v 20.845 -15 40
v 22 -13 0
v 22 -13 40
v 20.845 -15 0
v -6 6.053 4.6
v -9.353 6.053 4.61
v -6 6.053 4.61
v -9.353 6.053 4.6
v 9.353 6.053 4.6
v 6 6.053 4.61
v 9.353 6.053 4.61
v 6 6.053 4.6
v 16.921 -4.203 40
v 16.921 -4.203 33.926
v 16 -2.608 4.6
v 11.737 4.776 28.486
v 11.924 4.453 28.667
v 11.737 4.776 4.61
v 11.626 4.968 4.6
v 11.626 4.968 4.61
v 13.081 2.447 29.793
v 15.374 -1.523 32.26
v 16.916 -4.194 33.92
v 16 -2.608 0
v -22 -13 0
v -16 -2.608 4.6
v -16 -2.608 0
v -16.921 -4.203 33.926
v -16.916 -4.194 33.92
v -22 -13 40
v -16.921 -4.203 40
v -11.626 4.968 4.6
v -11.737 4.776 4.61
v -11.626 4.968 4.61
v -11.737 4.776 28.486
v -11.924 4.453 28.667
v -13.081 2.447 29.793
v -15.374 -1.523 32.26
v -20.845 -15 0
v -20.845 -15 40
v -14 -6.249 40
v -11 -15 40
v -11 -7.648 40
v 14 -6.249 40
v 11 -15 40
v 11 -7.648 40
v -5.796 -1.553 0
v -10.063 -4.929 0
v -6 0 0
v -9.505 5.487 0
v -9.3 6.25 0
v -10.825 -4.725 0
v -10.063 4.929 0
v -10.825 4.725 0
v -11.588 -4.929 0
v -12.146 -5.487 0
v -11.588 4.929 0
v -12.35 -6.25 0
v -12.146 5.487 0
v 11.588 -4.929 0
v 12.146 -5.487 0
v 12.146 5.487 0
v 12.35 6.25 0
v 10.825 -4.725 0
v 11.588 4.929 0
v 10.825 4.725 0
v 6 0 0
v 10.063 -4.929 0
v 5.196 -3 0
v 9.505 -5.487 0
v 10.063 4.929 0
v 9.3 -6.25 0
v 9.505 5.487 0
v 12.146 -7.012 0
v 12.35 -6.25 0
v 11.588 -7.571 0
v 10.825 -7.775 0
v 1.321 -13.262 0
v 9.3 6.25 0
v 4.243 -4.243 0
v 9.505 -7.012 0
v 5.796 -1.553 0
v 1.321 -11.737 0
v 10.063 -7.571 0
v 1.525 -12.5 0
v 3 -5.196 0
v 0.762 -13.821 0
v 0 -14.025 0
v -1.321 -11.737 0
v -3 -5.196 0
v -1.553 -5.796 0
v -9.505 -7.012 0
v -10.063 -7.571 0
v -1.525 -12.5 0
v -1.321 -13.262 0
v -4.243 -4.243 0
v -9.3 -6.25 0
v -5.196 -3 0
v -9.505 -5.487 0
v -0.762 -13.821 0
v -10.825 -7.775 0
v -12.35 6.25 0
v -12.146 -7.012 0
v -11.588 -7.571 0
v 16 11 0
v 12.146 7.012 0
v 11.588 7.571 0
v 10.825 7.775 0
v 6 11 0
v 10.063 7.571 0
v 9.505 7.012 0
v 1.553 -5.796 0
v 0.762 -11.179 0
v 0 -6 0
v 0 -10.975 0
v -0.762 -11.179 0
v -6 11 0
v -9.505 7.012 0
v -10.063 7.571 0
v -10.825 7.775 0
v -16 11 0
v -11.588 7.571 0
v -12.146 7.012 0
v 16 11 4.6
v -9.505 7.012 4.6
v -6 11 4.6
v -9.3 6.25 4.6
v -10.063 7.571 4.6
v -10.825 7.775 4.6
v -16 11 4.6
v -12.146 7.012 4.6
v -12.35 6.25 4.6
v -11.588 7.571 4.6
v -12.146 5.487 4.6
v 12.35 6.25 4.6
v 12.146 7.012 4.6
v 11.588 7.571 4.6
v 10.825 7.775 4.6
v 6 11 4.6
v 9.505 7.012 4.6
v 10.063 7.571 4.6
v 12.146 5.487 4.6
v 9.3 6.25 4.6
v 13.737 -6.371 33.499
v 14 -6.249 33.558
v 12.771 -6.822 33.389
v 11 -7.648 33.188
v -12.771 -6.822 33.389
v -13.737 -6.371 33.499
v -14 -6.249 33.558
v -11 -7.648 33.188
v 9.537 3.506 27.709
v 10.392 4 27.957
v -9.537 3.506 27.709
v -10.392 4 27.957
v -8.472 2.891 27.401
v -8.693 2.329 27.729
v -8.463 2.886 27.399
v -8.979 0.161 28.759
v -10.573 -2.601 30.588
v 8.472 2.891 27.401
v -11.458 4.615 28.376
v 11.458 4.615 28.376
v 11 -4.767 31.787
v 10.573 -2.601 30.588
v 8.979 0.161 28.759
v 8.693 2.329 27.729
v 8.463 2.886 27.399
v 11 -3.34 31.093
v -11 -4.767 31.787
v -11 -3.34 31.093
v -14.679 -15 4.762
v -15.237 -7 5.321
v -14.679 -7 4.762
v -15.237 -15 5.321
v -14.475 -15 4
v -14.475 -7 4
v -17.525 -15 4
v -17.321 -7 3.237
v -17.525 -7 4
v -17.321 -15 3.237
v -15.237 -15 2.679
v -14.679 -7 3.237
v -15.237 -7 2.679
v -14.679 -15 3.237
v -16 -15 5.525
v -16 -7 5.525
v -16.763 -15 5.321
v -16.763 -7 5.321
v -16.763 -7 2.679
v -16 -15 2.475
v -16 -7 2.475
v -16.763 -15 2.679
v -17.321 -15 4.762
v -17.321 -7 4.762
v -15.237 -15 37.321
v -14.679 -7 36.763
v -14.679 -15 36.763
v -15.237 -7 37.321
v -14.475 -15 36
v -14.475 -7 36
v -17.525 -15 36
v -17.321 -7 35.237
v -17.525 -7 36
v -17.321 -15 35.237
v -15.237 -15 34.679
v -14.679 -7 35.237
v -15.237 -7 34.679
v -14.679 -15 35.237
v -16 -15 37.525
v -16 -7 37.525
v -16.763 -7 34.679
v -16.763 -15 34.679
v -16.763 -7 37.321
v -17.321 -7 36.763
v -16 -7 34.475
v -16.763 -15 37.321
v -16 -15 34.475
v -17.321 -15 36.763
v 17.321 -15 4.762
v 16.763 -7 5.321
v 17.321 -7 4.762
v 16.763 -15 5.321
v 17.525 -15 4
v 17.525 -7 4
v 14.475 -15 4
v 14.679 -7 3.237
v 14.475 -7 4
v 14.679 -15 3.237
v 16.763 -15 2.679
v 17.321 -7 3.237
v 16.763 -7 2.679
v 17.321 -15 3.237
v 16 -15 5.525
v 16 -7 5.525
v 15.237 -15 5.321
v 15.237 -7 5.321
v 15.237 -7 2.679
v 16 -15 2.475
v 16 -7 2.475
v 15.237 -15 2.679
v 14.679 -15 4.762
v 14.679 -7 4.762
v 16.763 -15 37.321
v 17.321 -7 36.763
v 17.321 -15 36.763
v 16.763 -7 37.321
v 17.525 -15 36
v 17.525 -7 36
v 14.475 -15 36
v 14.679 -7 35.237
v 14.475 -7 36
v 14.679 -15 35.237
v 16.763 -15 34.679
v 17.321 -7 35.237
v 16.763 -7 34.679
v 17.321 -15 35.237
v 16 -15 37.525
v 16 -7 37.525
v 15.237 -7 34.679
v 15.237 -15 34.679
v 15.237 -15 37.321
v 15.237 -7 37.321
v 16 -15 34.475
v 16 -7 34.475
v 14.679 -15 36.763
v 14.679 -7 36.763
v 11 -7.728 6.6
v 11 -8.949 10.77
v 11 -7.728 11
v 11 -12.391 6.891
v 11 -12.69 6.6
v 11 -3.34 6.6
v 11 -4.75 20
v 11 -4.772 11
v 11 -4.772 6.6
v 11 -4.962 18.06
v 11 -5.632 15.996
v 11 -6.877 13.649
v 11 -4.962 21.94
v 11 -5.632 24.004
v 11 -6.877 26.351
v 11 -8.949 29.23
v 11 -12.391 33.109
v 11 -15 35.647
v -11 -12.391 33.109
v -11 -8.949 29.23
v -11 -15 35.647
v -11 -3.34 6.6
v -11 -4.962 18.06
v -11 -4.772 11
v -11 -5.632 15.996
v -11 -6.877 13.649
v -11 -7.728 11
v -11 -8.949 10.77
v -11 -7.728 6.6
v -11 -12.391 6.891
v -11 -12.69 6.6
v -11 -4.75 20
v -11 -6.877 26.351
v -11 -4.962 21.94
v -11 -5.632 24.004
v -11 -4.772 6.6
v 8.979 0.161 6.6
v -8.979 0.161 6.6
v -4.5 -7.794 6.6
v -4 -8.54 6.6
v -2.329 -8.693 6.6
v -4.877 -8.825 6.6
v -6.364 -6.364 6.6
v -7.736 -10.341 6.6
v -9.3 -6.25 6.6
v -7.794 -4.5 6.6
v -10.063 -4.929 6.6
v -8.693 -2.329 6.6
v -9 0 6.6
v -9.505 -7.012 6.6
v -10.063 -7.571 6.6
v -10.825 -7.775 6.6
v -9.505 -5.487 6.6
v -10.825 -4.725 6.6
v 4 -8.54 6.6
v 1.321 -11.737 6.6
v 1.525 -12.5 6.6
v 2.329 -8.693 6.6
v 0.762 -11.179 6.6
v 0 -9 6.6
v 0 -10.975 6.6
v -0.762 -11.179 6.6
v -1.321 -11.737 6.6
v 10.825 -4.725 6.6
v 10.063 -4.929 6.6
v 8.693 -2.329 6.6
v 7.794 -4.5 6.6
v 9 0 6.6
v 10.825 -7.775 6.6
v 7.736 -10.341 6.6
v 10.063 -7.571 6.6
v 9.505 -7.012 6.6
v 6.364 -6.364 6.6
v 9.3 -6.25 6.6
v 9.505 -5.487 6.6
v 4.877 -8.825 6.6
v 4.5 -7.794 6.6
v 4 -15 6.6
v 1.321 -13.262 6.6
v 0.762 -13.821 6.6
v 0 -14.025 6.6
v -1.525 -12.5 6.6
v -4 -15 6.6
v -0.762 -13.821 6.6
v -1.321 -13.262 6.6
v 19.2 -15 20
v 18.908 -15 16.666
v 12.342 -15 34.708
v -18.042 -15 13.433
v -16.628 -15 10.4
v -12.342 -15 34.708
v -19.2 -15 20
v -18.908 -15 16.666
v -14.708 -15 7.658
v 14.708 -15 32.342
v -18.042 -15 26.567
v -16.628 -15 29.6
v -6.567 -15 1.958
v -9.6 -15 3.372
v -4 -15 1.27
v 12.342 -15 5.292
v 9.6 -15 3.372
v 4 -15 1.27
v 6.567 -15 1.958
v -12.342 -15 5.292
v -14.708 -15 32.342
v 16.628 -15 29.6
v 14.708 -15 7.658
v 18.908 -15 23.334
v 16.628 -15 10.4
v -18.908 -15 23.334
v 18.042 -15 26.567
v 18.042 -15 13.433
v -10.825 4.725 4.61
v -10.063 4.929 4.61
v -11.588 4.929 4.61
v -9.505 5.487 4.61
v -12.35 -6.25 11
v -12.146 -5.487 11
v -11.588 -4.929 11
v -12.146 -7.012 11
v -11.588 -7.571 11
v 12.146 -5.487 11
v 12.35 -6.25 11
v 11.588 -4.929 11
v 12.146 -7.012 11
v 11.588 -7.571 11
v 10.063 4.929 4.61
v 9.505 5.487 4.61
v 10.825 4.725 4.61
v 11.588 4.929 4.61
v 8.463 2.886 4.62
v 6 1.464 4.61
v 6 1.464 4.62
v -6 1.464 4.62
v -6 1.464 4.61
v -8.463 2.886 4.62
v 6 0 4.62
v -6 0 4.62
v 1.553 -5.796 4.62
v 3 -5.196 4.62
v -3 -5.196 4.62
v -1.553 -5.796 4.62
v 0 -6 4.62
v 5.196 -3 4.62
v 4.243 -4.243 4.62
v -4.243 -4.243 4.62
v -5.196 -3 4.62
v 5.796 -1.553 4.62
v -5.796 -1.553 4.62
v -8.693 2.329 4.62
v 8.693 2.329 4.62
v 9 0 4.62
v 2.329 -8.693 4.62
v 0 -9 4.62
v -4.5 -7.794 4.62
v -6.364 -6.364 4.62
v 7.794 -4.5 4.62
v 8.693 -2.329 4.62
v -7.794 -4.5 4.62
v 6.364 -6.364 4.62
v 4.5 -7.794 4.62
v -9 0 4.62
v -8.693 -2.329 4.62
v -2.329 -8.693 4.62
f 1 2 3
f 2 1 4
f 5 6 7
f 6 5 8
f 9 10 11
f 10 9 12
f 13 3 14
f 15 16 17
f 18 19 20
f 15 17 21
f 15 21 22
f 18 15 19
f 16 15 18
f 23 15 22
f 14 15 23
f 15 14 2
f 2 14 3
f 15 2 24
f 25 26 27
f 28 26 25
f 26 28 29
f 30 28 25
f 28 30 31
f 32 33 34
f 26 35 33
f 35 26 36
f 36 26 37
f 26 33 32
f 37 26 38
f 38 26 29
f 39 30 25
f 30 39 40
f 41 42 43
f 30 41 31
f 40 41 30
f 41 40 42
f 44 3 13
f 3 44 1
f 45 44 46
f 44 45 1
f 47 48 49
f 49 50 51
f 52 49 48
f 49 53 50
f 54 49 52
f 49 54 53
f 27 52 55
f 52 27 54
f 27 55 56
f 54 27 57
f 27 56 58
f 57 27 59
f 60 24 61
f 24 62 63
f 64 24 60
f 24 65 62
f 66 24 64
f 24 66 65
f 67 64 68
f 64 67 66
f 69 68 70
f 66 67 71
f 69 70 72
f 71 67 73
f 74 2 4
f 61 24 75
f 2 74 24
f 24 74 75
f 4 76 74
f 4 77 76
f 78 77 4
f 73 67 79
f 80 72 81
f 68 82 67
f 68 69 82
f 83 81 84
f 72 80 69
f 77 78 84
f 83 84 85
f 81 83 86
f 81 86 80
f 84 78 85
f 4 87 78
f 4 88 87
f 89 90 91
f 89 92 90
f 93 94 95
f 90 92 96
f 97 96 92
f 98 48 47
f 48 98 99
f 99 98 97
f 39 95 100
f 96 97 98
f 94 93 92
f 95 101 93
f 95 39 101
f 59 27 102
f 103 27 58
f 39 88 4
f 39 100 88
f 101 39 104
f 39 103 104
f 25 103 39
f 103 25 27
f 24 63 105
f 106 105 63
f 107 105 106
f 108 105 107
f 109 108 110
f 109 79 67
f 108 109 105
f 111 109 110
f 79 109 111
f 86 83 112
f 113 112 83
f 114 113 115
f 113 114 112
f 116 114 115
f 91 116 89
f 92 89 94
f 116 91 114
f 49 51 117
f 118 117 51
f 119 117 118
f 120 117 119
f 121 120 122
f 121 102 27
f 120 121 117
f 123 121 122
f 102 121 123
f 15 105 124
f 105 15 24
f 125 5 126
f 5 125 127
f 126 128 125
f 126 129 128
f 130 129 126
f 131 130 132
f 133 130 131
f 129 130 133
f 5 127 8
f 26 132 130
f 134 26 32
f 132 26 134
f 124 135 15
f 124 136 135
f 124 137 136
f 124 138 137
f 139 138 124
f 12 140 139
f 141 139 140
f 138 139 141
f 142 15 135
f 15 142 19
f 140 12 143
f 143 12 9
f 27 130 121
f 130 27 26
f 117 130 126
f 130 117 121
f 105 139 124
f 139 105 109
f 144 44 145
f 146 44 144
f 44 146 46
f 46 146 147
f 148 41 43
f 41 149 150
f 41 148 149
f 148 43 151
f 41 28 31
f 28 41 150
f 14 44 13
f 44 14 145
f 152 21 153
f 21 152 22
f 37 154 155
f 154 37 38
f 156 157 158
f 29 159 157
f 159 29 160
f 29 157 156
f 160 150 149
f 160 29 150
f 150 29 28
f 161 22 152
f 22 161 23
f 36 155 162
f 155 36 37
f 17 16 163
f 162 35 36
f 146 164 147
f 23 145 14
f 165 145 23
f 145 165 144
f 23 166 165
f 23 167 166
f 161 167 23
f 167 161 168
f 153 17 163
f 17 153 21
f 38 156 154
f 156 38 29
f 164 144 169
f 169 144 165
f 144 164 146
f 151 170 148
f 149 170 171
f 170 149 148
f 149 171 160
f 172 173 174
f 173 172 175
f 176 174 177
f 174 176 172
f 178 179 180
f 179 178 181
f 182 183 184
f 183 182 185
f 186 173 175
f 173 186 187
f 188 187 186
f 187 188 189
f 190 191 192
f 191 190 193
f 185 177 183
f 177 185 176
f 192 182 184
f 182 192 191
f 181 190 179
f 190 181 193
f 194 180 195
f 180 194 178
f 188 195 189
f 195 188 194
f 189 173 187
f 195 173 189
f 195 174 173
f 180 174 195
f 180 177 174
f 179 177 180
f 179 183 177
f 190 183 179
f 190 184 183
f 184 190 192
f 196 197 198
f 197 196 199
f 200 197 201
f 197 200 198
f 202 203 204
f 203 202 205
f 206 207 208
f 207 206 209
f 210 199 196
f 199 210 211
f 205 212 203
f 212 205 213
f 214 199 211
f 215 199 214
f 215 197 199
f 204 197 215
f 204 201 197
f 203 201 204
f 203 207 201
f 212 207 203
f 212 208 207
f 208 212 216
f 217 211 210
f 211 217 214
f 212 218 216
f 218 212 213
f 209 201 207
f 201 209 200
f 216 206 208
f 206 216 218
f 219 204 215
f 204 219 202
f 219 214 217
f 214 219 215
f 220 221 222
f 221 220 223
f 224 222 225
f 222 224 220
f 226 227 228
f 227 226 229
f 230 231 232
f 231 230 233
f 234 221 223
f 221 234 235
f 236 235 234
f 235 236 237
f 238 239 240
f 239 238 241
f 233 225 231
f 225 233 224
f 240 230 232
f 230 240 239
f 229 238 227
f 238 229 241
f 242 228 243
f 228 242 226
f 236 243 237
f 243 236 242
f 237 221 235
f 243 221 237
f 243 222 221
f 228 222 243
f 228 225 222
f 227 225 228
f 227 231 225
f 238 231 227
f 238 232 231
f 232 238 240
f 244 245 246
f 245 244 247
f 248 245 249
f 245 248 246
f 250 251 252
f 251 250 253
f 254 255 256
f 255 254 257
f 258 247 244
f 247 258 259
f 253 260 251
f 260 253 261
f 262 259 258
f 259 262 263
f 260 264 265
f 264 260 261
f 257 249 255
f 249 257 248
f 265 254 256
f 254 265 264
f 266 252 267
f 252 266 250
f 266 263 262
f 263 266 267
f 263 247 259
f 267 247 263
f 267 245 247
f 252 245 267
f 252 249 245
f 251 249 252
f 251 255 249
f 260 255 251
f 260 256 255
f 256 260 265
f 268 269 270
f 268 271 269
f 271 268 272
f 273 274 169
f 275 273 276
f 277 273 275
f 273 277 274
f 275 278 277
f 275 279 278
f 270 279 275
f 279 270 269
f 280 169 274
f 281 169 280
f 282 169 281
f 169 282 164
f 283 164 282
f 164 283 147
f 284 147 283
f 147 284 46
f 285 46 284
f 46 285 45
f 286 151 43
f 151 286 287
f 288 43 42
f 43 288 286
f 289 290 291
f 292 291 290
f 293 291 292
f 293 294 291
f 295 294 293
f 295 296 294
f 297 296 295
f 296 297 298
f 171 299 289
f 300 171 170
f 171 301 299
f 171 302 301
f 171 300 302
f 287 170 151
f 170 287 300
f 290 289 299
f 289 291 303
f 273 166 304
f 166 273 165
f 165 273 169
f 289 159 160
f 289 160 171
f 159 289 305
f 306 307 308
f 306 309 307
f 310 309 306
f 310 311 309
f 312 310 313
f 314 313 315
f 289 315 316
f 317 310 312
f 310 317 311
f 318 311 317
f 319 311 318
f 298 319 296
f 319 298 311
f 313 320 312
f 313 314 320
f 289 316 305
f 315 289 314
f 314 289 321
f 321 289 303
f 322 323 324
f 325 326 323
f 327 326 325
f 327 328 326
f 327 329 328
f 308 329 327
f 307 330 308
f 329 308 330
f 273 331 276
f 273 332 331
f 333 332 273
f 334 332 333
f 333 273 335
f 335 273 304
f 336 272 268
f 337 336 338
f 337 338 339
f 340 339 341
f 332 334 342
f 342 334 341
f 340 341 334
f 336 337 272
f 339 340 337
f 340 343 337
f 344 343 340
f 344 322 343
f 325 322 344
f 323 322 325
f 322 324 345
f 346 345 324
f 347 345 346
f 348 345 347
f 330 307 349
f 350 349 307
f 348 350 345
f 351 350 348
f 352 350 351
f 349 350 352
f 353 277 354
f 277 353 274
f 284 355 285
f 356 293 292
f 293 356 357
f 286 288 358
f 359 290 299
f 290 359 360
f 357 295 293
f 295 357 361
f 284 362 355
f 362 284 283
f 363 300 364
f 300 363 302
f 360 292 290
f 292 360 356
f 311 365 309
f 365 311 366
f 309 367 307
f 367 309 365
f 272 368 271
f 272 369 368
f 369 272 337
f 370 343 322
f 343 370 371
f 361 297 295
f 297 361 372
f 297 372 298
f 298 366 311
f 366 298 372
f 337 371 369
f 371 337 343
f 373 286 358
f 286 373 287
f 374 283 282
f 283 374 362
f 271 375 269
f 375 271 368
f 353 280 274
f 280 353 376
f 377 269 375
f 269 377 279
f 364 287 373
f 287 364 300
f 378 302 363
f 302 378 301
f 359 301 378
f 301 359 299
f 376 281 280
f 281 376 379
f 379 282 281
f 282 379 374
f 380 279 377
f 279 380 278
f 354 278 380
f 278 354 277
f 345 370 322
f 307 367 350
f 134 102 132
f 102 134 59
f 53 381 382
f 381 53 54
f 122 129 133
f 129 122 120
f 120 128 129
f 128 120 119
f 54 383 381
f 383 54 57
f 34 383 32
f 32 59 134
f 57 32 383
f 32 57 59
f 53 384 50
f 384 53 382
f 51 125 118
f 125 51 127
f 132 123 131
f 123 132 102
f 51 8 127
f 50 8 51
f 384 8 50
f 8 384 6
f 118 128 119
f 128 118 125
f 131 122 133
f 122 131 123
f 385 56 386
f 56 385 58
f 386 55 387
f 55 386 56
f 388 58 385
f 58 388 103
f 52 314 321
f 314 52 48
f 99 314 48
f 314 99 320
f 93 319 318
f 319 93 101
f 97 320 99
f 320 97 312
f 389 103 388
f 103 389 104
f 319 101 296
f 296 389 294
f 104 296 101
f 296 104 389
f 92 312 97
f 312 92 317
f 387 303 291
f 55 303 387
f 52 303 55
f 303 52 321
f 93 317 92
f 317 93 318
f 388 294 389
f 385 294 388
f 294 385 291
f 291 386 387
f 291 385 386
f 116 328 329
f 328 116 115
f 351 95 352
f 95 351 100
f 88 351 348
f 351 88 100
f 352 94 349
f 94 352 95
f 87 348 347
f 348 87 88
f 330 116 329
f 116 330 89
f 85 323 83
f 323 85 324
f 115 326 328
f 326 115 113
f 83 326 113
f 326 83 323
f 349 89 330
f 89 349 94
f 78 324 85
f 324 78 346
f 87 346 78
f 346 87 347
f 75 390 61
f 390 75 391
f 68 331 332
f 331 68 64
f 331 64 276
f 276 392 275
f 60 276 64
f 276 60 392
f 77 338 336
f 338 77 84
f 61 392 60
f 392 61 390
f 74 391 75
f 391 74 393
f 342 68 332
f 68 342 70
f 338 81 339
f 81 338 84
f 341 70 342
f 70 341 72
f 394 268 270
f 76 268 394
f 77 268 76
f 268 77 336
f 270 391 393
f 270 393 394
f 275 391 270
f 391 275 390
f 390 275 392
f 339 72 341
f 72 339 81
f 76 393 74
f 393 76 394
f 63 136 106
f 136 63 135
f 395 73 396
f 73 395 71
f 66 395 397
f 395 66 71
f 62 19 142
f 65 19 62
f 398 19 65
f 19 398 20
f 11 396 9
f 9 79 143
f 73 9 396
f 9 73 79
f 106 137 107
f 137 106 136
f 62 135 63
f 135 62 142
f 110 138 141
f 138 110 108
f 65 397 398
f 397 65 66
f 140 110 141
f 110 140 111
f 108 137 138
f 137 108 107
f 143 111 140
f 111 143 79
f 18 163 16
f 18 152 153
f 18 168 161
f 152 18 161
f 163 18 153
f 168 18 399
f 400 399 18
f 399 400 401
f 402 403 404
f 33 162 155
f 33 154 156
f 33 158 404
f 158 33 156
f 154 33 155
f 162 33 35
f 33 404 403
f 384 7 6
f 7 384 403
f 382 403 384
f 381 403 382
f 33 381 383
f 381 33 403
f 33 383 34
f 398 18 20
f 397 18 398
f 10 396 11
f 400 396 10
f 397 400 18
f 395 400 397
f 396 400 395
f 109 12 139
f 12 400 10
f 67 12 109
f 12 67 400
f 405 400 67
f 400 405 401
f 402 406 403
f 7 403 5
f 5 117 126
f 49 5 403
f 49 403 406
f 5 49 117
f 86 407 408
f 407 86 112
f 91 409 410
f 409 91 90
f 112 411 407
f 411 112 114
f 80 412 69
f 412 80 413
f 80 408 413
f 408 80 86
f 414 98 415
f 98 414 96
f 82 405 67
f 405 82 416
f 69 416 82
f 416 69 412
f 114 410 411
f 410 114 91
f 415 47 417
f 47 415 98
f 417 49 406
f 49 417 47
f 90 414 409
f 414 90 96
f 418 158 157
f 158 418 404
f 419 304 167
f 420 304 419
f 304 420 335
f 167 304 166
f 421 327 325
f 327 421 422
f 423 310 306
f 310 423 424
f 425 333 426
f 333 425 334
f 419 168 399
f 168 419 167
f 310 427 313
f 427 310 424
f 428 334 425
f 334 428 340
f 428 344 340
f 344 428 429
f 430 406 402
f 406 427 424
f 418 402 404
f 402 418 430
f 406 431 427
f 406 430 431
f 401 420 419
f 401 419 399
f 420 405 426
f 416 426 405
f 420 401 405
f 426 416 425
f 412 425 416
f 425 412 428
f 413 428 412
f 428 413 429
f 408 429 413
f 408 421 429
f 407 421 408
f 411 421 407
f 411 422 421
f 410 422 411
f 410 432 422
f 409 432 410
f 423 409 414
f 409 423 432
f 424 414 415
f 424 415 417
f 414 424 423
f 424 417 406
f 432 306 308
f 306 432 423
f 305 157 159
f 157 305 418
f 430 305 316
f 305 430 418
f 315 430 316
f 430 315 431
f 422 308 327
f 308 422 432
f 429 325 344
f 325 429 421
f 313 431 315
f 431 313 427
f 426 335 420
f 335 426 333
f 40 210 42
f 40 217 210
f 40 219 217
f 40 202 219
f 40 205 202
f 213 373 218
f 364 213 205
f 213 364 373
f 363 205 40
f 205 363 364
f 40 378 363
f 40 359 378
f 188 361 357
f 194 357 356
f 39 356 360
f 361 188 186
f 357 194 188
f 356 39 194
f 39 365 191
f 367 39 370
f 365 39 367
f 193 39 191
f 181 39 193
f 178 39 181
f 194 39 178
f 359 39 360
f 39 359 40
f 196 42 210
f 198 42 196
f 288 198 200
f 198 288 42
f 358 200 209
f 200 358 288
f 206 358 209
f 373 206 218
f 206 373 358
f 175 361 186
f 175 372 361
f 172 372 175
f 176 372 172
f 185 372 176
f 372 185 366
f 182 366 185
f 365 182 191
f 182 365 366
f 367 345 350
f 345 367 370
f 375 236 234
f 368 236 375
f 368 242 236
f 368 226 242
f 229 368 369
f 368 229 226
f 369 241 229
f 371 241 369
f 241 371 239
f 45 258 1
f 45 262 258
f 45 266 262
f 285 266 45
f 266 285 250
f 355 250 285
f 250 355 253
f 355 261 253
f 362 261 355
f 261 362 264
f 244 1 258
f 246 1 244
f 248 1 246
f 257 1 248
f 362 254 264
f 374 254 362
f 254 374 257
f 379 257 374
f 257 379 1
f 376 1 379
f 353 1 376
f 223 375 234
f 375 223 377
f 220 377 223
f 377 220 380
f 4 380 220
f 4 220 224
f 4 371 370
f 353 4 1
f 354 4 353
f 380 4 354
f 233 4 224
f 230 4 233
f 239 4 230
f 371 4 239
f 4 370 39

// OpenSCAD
// file: ../include/configuration.scad
// Increase this if your slicer or printer make holes too tight.
extra_radius = 0.1;

// OD = outside diameter, corner to corner.
m3_nut_od = 6.1;
m3_nut_radius = m3_nut_od/2 + 0.2 + extra_radius;
m3_washer_radius = 3.5 + extra_radius;

// Major diameter of metric 3mm thread.
m3_major = 2.85;
m3_radius = m3_major/2 + extra_radius;
m3_wide_radius = m3_major/2 + extra_radius + 0.2;

// NEMA17 stepper motors.
motor_shaft_diameter = 5;
motor_shaft_radius = motor_shaft_diameter/2 + extra_radius;

// Frame brackets. M3x8mm screws work best with 3.6 mm brackets.
thickness = 3.6;

// OpenBeam or Misumi. Currently only 15x15 mm, but there is a plan
// to make models more parametric and allow 20x20 mm in the future.
extrusion = 15;

// Placement for the NEMA17 stepper motors.
motor_offset = 44;
motor_length = 47;
// main file
include <../include/configuration.scad>;

barrel_radius = 8;
barrel_height = 30;

groove_radius = 6;
groove_height = 4.6;

fan_offset = 15;

module hotend_fan() {
  difference() {
    union() {
      translate([0, 2 - fan_offset, 0])
        cylinder(r=22, h=40, $fn=6);
      translate([0, 0, groove_height/2])
        cube([32, 22, groove_height], center=true);
    }
    // Opposite side cutaway (outgoing airflow).
    translate([0, 38, groove_height + 0.01]) rotate([0, 0, 30])
      cylinder(r=40, h=200, $fn=6);
    // Groove mount insert slot.
    translate([0, 10, 0])
      cube([2*groove_radius, 20, 20], center=true);
    // Keep printed plastic away from the hotend.
    intersection() {
      translate([0, 18, 0]) rotate([0, 0, 30])
        cylinder(r=28, h=100, center=true, $fn=36);
      translate([0, 10, barrel_height-5])
        cylinder(r1=barrel_radius-1, r2=100, h=55, $fn=36);
    }
    // Groove mount.
    cylinder(r=groove_radius, h=200, center=true, $fn=24);
    // J-Head barrel.
    translate([0, 0, groove_height + 0.02])
      cylinder(r=barrel_radius + 1, h=100, $fn=24);
    // Fan mounting surface and screws.
    translate([0, -50 - fan_offset, 0])
      cube([100, 100, 100], center=true);
    for (x = [-16, 16]) {
      for (z = [-16, 16]) {
        translate([x, -fan_offset, z+20]) rotate([90, 0, 0]) #
          cylinder(r=m3_radius, h=16, center=true, $fn=12);
      }
    }
    // Vertical inner space.
    intersection() {
      cube([22, 100, 100], center=true);
      translate([0, -12, groove_height + 2])
        cylinder(r=16, h=40, $fn=6);
    }
    // Air funnel.
    difference() {
      translate([0, -1 - fan_offset, 20]) rotate([-90, 0, 0])
        cylinder(r1=20, r2=0, h=25, $fn=36);
      cube([8, 40, 40], center=true);
    }
    for (a = [60:60:359]) {
      rotate([0, 0, a]) translate([0, 12.5, 5]) #
        cylinder(r=m3_radius, h=12, center=true, $fn=12);
    }
  }
}

hotend_fan();

// Hotend barrel.
translate([0, 0, groove_height]) %
  cylinder(r=barrel_radius, h=barrel_height);

// 40mm fan.
translate([0, -5 - fan_offset, 20]) % difference() {
  cube([40, 10, 40], center=true);
  rotate([90, 0, 0,]) cylinder(r=19, h=20, center=true);
}
